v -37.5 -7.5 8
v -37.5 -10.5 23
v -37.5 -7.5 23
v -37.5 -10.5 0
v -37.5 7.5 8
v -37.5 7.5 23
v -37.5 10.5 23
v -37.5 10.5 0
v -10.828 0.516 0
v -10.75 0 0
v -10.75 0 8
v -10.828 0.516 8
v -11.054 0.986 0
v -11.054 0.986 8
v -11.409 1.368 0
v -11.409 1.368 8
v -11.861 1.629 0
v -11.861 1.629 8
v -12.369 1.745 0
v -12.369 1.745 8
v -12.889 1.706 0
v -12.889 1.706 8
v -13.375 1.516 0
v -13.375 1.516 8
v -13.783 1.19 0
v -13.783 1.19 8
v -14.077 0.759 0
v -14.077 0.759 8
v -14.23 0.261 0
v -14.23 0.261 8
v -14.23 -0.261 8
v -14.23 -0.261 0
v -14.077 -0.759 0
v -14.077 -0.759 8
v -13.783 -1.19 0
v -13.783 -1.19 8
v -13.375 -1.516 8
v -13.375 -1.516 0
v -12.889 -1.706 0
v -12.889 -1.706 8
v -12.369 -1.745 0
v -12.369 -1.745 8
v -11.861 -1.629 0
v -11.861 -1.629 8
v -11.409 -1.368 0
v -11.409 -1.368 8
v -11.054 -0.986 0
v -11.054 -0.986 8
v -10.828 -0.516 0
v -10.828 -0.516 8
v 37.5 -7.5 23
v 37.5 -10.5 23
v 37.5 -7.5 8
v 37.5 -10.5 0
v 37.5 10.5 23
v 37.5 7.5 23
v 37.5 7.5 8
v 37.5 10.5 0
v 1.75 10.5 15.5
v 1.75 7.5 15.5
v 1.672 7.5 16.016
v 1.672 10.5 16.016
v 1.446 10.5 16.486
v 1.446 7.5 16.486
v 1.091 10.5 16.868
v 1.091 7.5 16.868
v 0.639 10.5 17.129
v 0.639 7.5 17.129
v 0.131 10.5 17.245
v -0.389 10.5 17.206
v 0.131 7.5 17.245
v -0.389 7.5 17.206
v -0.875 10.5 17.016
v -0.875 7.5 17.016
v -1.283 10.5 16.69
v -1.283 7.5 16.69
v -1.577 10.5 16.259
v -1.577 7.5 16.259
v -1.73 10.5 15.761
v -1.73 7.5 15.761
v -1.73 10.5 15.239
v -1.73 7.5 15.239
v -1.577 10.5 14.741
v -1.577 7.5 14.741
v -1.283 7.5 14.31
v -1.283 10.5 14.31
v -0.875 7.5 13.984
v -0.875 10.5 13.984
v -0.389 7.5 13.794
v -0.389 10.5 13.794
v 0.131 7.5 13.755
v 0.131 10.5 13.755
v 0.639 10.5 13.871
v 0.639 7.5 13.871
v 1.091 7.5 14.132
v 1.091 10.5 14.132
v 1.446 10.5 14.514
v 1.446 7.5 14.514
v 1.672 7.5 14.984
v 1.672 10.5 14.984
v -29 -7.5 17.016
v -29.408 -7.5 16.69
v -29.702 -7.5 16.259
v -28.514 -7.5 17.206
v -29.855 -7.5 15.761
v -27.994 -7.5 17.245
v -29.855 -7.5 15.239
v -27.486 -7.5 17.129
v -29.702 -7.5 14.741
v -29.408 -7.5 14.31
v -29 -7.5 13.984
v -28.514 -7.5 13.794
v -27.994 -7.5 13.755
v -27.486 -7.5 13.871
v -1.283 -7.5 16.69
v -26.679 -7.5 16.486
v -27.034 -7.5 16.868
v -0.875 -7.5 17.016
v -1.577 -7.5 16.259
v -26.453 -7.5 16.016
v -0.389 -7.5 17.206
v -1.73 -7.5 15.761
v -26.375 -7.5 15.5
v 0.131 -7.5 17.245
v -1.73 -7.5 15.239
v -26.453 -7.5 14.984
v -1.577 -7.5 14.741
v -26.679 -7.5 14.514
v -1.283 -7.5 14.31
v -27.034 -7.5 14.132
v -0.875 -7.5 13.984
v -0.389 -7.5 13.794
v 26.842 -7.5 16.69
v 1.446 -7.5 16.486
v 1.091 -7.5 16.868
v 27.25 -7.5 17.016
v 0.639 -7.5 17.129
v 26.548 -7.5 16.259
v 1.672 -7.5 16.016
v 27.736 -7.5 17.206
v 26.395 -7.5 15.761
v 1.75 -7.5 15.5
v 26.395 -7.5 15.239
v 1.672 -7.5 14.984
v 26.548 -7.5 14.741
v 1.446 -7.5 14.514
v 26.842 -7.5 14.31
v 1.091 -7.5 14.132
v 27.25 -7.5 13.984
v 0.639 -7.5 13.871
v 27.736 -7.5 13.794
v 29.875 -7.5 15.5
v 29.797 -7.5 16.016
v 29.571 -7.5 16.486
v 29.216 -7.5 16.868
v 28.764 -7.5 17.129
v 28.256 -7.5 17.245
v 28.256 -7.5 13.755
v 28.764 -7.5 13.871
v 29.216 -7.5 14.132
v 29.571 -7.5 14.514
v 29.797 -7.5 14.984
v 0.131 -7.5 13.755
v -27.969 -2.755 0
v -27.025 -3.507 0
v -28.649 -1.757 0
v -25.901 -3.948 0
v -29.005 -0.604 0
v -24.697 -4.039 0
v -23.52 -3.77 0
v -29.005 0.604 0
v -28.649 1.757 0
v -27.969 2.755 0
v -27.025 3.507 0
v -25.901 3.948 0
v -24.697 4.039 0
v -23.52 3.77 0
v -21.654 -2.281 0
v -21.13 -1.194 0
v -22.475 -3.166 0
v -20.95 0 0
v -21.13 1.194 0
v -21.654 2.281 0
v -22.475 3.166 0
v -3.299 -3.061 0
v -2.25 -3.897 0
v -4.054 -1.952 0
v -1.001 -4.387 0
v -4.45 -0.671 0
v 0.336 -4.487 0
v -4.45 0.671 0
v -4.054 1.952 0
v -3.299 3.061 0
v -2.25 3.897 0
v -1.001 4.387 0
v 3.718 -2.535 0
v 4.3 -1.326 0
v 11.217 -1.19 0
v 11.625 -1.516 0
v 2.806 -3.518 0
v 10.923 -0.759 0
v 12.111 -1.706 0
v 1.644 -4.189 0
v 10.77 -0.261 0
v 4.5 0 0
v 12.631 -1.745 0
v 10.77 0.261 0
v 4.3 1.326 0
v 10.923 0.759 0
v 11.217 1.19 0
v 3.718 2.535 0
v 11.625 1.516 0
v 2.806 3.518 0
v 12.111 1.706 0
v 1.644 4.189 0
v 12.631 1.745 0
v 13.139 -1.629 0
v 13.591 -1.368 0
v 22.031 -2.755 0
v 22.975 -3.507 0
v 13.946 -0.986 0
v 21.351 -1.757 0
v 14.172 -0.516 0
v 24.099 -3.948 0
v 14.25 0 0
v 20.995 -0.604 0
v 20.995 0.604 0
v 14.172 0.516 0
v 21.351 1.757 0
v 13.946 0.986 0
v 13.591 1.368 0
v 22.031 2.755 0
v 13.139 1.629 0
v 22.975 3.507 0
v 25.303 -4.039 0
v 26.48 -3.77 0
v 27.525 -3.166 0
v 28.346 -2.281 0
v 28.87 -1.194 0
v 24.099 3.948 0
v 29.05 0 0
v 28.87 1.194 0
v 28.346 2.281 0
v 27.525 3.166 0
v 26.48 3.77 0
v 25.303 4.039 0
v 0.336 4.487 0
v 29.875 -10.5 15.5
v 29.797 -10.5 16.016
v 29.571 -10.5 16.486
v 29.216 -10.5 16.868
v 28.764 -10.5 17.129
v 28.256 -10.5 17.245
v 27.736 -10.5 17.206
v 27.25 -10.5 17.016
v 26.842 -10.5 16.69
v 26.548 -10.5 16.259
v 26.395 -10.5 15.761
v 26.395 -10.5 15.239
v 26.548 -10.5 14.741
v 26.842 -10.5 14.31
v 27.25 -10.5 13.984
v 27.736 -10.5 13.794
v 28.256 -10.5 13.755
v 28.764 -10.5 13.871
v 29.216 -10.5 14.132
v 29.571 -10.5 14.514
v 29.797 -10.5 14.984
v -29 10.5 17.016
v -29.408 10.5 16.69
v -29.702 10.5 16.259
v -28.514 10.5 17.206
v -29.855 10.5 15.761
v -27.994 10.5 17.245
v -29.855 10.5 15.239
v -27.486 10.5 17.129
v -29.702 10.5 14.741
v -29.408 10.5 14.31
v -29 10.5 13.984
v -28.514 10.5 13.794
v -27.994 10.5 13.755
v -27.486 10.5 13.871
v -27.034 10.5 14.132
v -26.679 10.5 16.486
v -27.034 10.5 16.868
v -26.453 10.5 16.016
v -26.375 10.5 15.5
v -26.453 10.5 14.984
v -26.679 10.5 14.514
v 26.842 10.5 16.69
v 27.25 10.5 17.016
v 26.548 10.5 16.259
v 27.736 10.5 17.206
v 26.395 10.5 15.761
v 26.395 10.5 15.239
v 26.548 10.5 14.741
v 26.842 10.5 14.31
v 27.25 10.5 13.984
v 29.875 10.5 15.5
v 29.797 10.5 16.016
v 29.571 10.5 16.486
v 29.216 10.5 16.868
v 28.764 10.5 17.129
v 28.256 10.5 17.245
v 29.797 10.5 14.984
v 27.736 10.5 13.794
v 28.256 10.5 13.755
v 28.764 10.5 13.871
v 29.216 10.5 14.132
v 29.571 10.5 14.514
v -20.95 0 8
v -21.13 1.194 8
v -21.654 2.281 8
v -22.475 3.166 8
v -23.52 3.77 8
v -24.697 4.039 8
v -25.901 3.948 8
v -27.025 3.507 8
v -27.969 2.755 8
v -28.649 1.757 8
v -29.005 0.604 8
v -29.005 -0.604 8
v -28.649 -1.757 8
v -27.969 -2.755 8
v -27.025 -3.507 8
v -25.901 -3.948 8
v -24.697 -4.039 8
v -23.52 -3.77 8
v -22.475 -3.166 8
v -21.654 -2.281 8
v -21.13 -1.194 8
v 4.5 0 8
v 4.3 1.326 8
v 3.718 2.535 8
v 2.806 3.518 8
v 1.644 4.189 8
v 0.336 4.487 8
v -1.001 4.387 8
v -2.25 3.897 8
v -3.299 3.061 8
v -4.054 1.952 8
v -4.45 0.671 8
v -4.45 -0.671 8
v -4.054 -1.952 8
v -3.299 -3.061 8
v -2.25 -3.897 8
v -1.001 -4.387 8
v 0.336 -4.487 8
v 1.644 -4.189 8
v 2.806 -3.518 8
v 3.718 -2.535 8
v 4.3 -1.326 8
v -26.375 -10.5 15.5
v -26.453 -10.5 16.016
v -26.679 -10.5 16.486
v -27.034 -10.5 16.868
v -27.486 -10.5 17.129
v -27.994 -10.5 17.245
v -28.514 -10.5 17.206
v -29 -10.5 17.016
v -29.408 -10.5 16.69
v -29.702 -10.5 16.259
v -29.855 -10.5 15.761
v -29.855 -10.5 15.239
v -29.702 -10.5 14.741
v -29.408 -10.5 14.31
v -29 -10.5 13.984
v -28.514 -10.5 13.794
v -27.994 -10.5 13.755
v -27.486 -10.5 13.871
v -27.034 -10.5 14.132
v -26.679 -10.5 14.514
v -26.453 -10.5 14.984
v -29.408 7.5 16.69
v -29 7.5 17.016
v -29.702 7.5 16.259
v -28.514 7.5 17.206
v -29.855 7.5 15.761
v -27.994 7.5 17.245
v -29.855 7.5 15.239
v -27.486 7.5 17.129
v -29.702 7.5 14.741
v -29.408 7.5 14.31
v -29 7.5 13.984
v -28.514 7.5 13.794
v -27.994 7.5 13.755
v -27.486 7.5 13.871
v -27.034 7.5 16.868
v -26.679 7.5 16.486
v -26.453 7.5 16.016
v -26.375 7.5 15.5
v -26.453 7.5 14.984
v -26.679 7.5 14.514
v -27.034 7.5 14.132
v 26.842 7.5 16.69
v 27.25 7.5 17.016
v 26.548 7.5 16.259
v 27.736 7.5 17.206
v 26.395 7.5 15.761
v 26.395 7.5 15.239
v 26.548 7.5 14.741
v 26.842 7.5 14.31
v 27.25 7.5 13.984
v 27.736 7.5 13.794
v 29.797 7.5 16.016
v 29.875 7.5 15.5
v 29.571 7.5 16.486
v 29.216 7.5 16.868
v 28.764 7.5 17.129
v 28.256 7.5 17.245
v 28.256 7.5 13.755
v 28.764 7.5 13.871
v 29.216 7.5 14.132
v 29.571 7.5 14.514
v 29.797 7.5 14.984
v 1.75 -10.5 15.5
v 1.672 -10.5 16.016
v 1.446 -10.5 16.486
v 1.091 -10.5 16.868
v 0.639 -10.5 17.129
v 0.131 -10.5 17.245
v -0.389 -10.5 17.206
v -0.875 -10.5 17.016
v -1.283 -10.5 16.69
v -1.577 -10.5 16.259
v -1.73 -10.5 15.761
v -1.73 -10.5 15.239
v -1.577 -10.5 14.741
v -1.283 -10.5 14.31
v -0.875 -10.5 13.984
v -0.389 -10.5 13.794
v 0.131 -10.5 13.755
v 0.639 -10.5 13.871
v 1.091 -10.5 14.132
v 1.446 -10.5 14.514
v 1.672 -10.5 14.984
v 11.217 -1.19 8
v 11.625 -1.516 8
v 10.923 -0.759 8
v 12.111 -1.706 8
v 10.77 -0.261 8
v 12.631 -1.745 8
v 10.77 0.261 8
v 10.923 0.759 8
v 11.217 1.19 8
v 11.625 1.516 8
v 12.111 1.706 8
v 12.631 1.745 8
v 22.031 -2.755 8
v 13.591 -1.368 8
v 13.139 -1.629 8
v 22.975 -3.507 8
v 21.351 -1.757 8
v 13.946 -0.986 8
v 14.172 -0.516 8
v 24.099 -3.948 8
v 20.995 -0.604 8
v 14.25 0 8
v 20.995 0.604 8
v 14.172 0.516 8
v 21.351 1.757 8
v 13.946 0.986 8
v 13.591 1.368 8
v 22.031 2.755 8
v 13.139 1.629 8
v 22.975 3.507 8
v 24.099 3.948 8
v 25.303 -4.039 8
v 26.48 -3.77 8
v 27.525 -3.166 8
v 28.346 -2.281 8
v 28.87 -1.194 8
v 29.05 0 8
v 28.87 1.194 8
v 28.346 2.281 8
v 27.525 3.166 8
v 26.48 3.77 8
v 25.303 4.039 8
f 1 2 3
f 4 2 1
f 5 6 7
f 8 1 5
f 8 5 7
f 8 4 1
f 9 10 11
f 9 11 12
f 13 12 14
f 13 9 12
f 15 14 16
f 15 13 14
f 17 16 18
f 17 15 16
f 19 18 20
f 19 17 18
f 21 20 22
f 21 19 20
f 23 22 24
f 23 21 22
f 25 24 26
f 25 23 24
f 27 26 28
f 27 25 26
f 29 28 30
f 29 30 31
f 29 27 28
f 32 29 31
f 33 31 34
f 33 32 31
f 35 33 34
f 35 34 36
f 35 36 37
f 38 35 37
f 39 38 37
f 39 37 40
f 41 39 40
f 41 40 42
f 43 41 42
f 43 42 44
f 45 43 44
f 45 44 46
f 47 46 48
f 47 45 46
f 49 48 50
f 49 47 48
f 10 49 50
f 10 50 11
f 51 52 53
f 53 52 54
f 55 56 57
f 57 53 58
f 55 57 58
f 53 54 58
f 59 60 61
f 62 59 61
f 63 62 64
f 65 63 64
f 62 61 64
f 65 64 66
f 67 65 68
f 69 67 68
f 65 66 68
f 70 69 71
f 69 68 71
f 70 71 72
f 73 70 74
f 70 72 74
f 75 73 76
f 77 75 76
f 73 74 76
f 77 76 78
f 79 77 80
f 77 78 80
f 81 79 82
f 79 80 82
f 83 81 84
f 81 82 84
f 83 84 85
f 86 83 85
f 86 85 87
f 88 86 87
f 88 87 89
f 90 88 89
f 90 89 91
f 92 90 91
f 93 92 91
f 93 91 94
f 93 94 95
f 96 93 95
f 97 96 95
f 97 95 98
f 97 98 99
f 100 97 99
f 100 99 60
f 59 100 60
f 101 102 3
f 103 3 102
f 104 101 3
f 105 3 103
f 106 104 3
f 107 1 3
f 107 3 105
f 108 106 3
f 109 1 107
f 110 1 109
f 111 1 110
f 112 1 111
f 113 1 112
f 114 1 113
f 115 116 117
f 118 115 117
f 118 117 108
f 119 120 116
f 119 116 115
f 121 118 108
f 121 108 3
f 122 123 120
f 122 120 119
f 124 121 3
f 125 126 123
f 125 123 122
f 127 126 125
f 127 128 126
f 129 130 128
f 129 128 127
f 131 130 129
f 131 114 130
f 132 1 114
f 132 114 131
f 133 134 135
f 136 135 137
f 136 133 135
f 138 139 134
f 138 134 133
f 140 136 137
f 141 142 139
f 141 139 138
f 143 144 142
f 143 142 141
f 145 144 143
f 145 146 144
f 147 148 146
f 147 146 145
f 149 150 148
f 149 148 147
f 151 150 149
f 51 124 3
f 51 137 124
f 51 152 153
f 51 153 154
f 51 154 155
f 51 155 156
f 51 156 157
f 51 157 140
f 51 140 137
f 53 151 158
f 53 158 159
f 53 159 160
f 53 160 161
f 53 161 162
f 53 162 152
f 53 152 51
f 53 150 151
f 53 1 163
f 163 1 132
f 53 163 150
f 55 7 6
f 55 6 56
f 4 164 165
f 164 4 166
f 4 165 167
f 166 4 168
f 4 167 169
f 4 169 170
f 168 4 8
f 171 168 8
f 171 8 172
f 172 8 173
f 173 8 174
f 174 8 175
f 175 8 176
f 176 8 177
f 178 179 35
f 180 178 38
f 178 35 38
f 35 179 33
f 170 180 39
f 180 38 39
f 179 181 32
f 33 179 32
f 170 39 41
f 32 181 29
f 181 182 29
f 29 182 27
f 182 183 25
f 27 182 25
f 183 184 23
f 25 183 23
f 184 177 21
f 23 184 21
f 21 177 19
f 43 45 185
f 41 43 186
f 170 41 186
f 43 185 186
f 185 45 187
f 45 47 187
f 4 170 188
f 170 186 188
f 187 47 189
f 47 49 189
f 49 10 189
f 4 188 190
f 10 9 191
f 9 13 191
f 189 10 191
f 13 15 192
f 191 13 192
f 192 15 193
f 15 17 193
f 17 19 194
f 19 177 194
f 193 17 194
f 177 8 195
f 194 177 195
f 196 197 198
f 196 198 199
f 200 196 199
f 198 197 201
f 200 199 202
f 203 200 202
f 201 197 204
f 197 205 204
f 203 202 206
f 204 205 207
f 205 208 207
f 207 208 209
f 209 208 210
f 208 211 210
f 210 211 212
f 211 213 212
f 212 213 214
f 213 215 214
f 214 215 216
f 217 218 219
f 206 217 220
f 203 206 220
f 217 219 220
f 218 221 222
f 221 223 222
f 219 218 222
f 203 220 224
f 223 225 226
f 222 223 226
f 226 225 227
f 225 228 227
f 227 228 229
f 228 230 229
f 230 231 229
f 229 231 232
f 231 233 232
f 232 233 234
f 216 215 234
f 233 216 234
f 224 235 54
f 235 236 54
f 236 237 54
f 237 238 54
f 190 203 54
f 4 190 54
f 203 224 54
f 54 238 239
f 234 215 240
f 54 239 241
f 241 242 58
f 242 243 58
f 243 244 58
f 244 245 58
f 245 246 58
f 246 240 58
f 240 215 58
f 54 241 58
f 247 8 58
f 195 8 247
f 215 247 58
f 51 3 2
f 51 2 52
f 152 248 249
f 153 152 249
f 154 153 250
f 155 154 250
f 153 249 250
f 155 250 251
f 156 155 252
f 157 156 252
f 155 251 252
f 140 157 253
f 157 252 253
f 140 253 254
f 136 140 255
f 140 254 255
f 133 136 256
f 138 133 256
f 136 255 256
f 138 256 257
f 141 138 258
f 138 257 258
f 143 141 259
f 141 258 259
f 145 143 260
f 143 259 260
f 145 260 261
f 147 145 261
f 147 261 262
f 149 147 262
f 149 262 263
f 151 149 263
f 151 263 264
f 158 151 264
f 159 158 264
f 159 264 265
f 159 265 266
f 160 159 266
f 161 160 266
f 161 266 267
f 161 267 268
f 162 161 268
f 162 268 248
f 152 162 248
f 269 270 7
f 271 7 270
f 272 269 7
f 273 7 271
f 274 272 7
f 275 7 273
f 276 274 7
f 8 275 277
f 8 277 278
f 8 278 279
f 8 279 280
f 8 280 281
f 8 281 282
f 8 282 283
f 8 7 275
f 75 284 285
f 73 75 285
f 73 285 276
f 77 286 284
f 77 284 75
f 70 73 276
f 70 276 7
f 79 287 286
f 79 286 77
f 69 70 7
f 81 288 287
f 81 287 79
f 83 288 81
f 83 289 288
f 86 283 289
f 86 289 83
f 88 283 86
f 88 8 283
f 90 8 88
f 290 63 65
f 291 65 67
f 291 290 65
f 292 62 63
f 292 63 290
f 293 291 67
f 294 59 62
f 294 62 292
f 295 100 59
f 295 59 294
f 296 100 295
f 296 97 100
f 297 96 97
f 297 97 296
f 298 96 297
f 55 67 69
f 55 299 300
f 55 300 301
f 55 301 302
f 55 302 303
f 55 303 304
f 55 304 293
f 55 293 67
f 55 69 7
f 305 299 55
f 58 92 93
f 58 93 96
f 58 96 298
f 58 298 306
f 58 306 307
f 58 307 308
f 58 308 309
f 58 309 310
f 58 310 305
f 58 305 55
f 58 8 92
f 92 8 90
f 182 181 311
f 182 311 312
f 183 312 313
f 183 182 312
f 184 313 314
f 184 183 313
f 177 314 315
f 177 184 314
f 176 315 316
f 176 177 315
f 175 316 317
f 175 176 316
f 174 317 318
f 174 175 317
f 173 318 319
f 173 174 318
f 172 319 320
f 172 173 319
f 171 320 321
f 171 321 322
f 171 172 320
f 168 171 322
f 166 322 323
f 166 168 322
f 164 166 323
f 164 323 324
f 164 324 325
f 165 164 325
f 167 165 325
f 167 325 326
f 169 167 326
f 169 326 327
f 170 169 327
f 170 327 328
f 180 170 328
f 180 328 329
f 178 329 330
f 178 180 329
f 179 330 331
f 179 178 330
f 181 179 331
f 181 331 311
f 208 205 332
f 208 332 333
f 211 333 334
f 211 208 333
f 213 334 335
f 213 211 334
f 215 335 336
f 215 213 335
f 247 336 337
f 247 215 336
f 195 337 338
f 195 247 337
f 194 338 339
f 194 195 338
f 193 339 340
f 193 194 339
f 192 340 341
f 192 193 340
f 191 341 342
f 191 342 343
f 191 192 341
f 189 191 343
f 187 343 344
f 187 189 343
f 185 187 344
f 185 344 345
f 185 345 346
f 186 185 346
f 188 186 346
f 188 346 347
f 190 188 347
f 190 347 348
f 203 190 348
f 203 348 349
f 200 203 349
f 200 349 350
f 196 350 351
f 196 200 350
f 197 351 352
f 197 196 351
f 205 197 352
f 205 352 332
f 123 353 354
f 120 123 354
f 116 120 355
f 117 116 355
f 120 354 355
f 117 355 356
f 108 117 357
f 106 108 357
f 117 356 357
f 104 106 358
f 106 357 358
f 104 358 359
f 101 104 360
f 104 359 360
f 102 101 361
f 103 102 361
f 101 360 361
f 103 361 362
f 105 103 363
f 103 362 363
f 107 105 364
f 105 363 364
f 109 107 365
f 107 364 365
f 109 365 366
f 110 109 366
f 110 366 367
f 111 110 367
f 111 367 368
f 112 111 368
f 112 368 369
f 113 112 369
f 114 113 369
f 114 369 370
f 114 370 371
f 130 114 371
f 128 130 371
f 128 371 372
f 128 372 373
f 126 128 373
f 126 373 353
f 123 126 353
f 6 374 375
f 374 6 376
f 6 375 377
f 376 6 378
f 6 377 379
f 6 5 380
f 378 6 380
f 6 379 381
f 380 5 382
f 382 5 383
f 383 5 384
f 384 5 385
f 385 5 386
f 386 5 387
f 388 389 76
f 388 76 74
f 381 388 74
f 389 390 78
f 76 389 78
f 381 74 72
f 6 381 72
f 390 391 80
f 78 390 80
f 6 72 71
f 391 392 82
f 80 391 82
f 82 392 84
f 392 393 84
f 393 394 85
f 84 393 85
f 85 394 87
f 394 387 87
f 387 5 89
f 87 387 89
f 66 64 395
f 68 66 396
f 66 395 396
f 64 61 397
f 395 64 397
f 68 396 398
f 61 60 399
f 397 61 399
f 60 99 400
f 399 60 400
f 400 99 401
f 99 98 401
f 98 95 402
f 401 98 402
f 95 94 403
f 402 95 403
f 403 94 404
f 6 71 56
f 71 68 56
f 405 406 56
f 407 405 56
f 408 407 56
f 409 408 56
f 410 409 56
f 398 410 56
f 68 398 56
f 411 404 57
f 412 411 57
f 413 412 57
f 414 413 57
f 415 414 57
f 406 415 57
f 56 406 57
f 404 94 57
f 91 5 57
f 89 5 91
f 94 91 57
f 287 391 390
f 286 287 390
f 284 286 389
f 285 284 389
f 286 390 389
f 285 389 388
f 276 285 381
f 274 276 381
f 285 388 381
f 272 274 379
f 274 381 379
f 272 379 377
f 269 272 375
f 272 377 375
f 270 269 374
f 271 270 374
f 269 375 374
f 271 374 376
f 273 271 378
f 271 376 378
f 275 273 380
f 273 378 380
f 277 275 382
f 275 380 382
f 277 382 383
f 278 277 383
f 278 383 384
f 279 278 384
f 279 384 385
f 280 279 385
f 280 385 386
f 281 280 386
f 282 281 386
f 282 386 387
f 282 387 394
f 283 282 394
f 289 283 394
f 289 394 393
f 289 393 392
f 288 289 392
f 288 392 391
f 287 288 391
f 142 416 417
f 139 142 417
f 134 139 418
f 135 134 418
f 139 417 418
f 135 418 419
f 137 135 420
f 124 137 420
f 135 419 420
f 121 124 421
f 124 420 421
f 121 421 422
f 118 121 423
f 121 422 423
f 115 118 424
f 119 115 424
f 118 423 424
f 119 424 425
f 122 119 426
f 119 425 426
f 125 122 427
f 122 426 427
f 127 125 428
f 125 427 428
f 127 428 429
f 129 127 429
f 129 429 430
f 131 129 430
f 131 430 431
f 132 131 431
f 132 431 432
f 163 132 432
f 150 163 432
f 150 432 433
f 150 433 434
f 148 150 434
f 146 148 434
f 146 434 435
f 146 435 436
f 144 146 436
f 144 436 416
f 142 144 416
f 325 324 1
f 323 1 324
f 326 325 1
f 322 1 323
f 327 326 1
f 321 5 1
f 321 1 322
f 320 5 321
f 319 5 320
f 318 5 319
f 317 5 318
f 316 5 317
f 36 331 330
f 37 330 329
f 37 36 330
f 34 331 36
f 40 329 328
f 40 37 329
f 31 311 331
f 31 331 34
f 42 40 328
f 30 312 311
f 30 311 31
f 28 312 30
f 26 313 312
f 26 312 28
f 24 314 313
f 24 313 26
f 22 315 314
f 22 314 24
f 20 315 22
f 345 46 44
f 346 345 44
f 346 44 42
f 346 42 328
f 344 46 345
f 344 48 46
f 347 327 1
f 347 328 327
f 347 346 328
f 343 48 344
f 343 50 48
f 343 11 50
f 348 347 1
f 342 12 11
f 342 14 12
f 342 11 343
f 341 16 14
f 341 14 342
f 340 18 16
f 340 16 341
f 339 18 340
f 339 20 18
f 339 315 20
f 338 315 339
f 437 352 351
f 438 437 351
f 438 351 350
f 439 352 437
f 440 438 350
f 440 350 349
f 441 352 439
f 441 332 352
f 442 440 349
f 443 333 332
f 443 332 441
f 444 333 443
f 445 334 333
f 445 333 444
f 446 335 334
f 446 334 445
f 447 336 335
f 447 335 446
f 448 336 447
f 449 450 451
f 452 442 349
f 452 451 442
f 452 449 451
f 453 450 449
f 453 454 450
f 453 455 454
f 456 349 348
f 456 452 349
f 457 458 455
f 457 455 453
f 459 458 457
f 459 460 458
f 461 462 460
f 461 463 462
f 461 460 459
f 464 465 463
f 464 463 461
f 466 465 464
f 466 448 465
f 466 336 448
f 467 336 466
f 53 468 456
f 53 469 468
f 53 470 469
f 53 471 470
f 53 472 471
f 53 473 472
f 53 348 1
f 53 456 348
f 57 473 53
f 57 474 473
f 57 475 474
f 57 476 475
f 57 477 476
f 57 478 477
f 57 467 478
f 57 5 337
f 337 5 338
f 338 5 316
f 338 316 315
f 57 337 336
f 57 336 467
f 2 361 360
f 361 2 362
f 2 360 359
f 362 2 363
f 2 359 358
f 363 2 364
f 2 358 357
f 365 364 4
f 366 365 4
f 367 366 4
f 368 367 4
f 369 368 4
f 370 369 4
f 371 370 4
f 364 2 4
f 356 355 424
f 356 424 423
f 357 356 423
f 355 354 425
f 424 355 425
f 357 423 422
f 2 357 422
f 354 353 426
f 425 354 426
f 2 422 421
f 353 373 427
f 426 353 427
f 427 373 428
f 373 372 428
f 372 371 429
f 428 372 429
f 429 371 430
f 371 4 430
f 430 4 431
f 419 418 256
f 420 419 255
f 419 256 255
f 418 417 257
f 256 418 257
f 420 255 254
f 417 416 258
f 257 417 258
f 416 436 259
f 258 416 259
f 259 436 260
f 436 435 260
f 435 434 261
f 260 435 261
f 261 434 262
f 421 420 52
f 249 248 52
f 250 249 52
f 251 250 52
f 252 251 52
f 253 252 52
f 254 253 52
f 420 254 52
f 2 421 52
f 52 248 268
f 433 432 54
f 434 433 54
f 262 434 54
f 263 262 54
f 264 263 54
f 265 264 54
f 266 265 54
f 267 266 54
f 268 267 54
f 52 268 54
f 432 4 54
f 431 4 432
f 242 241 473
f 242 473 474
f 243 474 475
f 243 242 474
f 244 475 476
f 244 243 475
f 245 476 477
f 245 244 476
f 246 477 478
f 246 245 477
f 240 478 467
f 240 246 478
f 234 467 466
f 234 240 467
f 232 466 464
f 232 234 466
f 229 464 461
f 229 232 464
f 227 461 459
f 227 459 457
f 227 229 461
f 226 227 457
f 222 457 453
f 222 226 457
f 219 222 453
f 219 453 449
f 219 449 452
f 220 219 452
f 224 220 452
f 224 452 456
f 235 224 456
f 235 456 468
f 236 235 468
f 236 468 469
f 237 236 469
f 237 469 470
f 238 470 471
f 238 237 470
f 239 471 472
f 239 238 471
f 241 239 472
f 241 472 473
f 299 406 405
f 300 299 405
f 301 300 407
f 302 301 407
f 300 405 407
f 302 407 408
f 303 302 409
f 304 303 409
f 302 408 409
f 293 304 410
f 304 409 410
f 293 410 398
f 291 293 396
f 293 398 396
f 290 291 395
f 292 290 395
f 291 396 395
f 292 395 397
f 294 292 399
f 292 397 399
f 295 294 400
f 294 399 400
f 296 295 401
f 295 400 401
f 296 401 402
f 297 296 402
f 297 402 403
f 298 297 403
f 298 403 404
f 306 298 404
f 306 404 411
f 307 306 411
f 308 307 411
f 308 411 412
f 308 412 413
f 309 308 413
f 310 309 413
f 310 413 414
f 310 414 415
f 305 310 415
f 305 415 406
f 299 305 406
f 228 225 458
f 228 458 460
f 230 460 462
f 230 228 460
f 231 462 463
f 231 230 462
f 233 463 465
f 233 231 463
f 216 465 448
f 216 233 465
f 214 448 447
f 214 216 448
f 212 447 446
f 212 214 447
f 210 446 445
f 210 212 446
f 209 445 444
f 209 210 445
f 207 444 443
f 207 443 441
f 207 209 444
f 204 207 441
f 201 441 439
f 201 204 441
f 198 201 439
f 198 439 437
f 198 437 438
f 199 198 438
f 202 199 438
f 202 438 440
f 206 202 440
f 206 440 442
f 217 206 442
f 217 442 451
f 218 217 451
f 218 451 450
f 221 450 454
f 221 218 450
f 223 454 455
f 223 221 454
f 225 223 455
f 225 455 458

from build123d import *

# Parameters (mm, degrees)
F0_W     = 75
F0_H     = 15
F0_R     = 4.05
F0_R_2   = 1.75
F0_R_3   = 4.5
F1_DEPTH = 8
F0_H_2   = 3
F2_DEPTH = 23
F3_R     = 1.75
F4_DEPTH = 25


with BuildPart() as f1:
    # F0 (on Top) → F1 (new body)
    with BuildSketch(Plane.XY):
        Rectangle(F0_W, F0_H)
        with Locations((-25, 0)):
            Circle(F0_R, mode=Mode.SUBTRACT)
        with Locations((-12.5, 0)):
            Circle(F0_R_2, mode=Mode.SUBTRACT)
        Circle(F0_R_3, mode=Mode.SUBTRACT)
        with Locations((12.5, 0)):
            Circle(F0_R_2, mode=Mode.SUBTRACT)
        with Locations((25, 0)):
            Circle(F0_R, mode=Mode.SUBTRACT)
    extrude(amount=F1_DEPTH)

    # F0 (on Top) → F2 (join)
    with BuildSketch(Plane.XY):
        with Locations((0, 9)):
            Rectangle(F0_W, F0_H_2)
        with Locations((0, -9)):
            Rectangle(F0_W, F0_H_2)
    extrude(amount=F2_DEPTH)

    # F3 (on face) → F4 (cut)
    with BuildSketch(Plane.XZ.offset(10.5)):
        with Locations((-28.125, 15.5)):
            Circle(F3_R)
        with Locations((0, 15.5)):
            Circle(F3_R)
        with Locations((28.125, 15.5)):
            Circle(F3_R)
    extrude(amount=-F4_DEPTH, mode=Mode.SUBTRACT)


solid = f1.part
